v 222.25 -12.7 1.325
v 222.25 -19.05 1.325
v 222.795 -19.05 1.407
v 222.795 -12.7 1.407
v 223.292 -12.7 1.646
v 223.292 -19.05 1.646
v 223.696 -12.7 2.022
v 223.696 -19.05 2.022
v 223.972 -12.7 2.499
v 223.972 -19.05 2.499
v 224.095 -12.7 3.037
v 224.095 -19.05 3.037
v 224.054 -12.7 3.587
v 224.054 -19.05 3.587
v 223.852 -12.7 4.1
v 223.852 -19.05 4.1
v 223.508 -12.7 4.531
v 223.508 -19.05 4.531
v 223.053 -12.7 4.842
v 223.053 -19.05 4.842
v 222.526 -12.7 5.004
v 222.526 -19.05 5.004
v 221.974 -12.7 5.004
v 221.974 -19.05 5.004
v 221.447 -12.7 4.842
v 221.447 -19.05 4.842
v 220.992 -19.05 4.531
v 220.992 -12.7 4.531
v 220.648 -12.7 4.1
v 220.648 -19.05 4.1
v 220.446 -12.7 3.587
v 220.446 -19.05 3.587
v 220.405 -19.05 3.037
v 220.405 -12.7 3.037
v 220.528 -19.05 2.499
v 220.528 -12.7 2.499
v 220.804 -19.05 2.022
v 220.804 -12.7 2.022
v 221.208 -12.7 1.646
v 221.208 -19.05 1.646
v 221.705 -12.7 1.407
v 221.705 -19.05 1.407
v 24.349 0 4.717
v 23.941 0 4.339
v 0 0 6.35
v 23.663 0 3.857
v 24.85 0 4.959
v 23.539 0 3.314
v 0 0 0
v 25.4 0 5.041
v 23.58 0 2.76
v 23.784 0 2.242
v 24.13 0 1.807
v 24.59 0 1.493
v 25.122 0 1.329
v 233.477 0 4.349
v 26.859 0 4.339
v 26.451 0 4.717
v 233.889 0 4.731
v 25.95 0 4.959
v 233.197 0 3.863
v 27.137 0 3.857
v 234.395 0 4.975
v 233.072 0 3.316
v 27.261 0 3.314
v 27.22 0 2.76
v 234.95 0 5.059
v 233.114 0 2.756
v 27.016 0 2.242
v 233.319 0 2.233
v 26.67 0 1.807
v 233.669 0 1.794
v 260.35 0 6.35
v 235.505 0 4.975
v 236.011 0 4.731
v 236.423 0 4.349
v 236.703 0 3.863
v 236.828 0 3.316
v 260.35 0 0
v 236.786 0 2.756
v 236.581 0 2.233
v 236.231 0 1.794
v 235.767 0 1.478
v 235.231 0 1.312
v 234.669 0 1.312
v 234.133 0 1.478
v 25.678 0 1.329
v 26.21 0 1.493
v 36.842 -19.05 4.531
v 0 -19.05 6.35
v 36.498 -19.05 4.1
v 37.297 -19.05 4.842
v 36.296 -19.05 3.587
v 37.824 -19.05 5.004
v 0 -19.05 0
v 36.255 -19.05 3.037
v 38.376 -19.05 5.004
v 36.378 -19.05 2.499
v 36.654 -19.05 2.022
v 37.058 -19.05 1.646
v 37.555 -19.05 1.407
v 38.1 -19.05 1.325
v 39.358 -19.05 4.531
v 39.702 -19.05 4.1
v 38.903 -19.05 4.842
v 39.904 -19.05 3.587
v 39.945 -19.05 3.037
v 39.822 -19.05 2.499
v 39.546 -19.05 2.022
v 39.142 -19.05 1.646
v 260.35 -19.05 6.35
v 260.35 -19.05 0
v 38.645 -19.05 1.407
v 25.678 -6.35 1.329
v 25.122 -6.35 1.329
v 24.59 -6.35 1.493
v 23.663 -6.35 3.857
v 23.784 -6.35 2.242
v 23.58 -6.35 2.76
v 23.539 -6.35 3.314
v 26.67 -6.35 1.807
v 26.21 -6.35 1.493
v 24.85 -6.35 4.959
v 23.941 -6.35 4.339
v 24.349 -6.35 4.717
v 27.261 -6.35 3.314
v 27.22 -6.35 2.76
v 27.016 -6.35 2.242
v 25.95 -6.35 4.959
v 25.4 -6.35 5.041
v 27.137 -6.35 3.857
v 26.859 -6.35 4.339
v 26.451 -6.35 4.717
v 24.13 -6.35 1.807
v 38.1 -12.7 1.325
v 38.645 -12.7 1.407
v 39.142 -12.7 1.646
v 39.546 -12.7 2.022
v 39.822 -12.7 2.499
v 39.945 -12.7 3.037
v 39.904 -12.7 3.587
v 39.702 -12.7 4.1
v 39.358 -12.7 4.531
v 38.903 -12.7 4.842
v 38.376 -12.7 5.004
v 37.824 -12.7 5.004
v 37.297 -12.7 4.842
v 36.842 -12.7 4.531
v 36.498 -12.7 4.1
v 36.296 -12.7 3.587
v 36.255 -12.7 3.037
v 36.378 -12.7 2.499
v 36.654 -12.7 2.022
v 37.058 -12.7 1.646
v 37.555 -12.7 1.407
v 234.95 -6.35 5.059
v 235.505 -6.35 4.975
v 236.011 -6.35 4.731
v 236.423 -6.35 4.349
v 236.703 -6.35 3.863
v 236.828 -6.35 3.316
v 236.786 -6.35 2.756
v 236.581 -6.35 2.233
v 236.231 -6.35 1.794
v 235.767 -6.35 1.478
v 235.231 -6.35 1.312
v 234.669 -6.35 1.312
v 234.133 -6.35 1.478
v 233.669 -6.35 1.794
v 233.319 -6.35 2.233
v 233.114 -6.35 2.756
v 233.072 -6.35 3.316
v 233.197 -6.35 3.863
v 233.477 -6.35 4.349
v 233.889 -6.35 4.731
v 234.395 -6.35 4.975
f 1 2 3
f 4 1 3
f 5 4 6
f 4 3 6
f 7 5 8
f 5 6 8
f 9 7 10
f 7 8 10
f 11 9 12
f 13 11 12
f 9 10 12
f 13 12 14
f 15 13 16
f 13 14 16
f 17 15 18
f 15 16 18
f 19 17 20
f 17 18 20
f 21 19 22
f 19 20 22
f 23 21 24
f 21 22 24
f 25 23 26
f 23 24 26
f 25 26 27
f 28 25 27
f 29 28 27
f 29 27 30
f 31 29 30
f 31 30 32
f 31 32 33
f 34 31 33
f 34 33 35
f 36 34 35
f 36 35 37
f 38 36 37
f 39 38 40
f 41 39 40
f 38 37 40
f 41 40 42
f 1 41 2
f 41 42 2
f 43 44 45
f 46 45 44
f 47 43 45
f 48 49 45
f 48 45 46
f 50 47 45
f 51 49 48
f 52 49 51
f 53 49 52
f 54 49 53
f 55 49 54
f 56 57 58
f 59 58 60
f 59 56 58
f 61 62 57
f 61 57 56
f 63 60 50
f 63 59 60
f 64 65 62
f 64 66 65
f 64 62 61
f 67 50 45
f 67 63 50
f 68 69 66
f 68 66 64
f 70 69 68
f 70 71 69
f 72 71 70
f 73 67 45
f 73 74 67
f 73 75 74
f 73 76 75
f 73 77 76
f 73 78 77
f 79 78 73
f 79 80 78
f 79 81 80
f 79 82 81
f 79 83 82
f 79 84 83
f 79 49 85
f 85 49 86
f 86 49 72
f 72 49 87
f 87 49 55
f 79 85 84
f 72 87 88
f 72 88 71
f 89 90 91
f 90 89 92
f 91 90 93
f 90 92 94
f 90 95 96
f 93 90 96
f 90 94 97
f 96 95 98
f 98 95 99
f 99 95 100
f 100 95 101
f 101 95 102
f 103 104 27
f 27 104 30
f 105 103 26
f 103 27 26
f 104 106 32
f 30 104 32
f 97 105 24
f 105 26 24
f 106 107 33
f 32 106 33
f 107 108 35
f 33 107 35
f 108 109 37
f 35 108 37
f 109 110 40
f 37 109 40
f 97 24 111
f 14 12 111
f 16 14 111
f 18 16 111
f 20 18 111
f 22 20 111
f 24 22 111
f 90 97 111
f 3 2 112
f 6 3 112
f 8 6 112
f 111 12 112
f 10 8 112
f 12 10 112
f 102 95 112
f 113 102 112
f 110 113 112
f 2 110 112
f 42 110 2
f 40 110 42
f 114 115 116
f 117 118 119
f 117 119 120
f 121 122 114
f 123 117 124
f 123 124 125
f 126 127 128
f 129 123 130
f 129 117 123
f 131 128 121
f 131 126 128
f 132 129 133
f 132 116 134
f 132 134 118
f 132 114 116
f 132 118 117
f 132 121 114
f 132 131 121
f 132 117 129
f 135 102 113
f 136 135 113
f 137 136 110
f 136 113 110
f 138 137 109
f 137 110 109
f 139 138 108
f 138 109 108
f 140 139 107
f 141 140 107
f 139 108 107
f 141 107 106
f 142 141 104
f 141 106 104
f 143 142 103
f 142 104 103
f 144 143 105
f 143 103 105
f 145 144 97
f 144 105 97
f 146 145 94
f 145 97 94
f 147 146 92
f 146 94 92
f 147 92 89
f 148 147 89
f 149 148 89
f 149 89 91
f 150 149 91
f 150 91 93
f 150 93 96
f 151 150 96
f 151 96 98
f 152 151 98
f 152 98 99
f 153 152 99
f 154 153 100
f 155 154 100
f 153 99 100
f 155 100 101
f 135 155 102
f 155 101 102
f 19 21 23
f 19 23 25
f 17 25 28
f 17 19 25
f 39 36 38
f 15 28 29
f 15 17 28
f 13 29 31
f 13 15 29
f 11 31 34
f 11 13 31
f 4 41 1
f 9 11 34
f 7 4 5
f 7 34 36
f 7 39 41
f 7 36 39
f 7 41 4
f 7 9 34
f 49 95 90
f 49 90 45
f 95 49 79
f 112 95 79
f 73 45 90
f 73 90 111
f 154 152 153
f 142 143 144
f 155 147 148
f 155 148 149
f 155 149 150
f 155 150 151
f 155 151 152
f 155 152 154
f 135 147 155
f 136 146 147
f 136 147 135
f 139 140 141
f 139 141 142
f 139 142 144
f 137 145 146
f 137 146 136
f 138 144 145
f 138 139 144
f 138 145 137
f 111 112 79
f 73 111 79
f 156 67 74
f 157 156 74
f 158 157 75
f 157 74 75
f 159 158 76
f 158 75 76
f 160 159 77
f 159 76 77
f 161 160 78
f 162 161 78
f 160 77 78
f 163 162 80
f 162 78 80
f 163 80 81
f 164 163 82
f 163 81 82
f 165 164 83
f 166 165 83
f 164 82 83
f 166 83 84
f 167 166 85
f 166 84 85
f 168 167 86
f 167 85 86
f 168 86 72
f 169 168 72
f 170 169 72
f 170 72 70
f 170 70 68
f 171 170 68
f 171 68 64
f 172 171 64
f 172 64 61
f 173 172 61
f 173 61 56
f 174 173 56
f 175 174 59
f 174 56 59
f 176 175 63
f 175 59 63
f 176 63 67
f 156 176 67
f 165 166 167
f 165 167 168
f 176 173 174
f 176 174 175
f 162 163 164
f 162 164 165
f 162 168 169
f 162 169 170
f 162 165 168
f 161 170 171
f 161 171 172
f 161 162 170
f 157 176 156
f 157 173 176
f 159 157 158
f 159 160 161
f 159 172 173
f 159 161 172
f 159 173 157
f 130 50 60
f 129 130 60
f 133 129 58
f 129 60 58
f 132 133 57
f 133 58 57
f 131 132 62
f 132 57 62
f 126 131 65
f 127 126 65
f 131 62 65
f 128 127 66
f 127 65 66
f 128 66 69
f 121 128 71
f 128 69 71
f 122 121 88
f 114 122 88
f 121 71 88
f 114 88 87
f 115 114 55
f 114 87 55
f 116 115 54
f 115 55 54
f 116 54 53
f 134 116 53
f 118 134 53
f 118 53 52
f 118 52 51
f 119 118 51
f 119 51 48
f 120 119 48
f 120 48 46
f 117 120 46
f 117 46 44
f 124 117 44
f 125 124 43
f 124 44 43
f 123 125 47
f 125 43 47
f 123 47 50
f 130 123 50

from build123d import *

# Parameters (mm, degrees)
SKETCH1_W           = 260.35
SKETCH1_H           = 19.05
BOSS_EXTRUDE1_DEPTH = 6.35
SKETCH2_R           = 1.88358262
SKETCH2_R_2         = 1.866453282
CUT_EXTRUDE1_DEPTH  = 6.35
SKETCH3_R           = 1.849990648
CUT_EXTRUDE2_DEPTH  = 6.35


with BuildPart() as part:
    # Sketch1 → Boss-Extrude1 (new body)
    with BuildSketch(Plane.XY):
        with Locations((130.175, -9.525)):
            Rectangle(SKETCH1_W, SKETCH1_H)
    extrude(amount=BOSS_EXTRUDE1_DEPTH)

    # Sketch2 → Cut-Extrude1 (cut)
    with BuildSketch(Plane(origin=(0, 0, 0), x_dir=(1, 0, 0), z_dir=(0, 1, 0))):
        with Locations(Location((234.95, -3.175, 0), (0, 0, 270))):
            Circle(SKETCH2_R)
        with Locations(Location((25.4, -3.175, 0), (0, 0, 270))):
            Circle(SKETCH2_R_2)
    extrude(amount=-CUT_EXTRUDE1_DEPTH, mode=Mode.SUBTRACT)

    # Sketch3 → Cut-Extrude2 (cut)
    with BuildSketch(Plane(origin=(0, -19.05, 0), x_dir=(-1, 0, 0), z_dir=(0, -1, 0))):
        with Locations(Location((-222.25, -3.175, 0), (0, 0, 90))):
            Circle(SKETCH3_R)
        with Locations(Location((-38.1, -3.175, 0), (0, 0, 90))):
            Circle(SKETCH3_R)
    extrude(amount=-CUT_EXTRUDE2_DEPTH, mode=Mode.SUBTRACT)


solid = part.part
